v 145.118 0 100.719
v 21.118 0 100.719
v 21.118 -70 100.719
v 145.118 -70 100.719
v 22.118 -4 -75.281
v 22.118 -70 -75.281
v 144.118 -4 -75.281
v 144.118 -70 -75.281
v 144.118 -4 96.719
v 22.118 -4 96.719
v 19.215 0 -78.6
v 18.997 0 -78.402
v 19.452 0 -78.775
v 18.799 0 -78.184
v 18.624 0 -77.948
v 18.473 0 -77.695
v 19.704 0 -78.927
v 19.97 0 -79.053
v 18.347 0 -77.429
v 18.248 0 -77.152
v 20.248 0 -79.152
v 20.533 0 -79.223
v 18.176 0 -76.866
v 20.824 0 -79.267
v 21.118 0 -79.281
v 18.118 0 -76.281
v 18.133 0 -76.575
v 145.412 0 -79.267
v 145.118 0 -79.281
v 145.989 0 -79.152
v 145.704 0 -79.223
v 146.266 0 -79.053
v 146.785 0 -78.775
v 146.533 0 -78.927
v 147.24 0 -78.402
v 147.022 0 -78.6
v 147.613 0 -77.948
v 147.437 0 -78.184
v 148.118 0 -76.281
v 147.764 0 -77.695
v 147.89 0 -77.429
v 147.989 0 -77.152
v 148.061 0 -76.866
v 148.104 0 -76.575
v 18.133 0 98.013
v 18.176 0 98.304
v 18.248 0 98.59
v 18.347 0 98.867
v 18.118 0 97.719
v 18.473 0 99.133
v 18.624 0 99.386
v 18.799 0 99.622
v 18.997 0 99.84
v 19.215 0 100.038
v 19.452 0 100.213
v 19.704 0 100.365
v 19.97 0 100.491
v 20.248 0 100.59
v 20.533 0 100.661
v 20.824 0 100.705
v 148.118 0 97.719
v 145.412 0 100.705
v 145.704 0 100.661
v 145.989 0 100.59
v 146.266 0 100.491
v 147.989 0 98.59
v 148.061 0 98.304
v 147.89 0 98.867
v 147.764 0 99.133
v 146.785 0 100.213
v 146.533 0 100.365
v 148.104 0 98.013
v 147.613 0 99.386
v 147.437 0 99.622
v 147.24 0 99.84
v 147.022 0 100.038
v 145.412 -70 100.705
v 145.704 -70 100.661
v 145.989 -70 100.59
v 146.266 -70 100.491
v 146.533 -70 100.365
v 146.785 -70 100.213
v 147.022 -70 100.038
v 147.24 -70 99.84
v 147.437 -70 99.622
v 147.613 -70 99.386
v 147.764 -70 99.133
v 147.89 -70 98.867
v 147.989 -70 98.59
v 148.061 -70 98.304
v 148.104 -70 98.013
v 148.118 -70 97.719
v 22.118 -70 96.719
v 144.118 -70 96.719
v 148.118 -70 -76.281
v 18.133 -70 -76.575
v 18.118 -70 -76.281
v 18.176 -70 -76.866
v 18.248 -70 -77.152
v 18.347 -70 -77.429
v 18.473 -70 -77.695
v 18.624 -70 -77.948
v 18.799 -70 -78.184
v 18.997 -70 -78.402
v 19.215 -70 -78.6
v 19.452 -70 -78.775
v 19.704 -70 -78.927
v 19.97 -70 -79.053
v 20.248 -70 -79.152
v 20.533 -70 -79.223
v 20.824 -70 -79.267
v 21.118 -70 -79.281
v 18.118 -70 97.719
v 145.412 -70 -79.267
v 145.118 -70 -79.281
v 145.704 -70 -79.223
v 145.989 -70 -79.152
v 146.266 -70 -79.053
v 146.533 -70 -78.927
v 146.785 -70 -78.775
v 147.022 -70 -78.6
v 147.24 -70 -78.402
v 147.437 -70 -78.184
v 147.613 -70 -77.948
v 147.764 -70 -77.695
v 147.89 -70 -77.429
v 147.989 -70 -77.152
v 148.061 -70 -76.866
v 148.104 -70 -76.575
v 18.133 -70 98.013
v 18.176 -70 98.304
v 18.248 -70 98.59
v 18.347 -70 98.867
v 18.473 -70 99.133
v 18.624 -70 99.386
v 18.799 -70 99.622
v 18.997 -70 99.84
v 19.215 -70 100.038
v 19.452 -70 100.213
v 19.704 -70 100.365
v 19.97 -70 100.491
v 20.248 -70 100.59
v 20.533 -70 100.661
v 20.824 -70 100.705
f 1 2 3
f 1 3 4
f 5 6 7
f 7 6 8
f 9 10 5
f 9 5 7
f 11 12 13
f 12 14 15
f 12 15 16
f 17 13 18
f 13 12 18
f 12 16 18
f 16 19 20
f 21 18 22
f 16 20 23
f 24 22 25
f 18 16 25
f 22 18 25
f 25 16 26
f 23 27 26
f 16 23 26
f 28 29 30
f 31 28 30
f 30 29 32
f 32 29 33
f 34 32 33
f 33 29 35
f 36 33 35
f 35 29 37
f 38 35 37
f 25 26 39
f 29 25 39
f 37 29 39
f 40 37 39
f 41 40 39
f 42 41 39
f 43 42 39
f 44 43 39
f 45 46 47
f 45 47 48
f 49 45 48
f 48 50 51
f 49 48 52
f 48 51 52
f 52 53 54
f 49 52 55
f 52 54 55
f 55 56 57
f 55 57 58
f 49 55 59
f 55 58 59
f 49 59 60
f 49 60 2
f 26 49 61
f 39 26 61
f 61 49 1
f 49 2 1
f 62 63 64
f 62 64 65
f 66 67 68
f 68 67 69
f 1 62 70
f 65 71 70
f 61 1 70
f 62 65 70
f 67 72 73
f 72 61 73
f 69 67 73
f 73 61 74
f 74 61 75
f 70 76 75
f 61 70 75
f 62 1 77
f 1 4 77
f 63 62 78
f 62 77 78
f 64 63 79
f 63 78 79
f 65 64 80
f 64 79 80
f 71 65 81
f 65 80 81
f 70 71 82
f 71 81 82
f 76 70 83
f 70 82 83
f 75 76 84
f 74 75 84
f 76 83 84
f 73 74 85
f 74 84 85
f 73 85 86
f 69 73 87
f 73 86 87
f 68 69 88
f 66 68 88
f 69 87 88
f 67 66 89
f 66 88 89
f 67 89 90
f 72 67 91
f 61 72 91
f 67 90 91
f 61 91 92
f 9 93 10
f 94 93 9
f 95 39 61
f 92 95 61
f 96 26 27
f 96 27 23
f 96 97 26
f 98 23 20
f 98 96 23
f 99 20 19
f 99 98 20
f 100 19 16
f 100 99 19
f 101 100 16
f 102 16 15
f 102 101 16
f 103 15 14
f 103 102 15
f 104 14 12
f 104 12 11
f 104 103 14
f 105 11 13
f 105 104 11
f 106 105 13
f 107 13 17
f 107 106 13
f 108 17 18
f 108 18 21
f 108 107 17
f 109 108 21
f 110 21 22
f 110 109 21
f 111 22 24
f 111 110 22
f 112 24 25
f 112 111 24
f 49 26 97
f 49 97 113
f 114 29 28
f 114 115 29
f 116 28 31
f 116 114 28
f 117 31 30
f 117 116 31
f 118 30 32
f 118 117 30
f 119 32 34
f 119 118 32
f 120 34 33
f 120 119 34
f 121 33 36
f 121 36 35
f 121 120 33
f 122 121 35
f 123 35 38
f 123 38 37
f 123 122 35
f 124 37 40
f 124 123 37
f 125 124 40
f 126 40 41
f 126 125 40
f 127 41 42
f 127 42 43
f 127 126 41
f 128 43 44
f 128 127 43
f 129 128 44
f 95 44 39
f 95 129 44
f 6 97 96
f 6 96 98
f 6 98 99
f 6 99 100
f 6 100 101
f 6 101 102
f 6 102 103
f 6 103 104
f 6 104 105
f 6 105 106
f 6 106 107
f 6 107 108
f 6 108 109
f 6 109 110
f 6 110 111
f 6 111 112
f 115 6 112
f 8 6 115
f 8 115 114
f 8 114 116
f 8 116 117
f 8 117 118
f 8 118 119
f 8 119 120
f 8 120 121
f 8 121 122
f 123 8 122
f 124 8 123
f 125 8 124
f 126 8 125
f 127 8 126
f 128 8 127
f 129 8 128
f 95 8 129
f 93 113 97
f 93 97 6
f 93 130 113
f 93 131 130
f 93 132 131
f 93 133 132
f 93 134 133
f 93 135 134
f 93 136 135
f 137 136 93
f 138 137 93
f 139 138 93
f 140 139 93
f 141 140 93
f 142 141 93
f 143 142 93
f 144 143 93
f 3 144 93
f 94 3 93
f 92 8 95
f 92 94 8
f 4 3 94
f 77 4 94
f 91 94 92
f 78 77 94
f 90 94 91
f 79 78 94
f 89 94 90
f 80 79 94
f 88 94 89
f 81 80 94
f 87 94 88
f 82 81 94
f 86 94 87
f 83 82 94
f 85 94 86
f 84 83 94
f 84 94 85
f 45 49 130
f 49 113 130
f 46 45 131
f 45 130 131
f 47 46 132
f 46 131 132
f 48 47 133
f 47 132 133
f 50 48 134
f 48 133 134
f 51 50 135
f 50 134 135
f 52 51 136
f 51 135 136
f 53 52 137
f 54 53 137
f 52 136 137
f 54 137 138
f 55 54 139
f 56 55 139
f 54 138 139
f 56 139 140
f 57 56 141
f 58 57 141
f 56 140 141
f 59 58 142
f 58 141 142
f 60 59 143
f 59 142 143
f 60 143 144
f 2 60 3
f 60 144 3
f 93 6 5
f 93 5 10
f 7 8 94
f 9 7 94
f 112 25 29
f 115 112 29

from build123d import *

# Parameters (mm, degrees)
F0_W     = 130
F0_H     = 180
F1_DEPTH = 70
F2_W     = 122
F2_H     = 172
F3_DEPTH = 66
F4_R     = 3


with BuildPart() as f1:
    # F0 (on Front) → F1 (new body)
    with BuildSketch(Plane.XZ):
        with Locations((83.118406, 10.718986)):
            Rectangle(F0_W, F0_H)
    extrude(amount=F1_DEPTH)

    # F2 (on face) → F3 (cut)
    with BuildSketch(Plane.XZ.offset(70)):
        with Locations((83.118406, 10.718986)):
            Rectangle(F2_W, F2_H)
    extrude(amount=-F3_DEPTH, mode=Mode.SUBTRACT)

    # F4
    f4_edges = [f1.edges().sort_by_distance(p)[0] for p in [
        (18.118406, -35, 100.718986),
        (148.118406, -35, 100.718986),
        (18.118406, -35, -79.281014),
        (148.118406, -35, -79.281014),
    ]]
    fillet(f4_edges, radius=F4_R)


solid = f1.part
